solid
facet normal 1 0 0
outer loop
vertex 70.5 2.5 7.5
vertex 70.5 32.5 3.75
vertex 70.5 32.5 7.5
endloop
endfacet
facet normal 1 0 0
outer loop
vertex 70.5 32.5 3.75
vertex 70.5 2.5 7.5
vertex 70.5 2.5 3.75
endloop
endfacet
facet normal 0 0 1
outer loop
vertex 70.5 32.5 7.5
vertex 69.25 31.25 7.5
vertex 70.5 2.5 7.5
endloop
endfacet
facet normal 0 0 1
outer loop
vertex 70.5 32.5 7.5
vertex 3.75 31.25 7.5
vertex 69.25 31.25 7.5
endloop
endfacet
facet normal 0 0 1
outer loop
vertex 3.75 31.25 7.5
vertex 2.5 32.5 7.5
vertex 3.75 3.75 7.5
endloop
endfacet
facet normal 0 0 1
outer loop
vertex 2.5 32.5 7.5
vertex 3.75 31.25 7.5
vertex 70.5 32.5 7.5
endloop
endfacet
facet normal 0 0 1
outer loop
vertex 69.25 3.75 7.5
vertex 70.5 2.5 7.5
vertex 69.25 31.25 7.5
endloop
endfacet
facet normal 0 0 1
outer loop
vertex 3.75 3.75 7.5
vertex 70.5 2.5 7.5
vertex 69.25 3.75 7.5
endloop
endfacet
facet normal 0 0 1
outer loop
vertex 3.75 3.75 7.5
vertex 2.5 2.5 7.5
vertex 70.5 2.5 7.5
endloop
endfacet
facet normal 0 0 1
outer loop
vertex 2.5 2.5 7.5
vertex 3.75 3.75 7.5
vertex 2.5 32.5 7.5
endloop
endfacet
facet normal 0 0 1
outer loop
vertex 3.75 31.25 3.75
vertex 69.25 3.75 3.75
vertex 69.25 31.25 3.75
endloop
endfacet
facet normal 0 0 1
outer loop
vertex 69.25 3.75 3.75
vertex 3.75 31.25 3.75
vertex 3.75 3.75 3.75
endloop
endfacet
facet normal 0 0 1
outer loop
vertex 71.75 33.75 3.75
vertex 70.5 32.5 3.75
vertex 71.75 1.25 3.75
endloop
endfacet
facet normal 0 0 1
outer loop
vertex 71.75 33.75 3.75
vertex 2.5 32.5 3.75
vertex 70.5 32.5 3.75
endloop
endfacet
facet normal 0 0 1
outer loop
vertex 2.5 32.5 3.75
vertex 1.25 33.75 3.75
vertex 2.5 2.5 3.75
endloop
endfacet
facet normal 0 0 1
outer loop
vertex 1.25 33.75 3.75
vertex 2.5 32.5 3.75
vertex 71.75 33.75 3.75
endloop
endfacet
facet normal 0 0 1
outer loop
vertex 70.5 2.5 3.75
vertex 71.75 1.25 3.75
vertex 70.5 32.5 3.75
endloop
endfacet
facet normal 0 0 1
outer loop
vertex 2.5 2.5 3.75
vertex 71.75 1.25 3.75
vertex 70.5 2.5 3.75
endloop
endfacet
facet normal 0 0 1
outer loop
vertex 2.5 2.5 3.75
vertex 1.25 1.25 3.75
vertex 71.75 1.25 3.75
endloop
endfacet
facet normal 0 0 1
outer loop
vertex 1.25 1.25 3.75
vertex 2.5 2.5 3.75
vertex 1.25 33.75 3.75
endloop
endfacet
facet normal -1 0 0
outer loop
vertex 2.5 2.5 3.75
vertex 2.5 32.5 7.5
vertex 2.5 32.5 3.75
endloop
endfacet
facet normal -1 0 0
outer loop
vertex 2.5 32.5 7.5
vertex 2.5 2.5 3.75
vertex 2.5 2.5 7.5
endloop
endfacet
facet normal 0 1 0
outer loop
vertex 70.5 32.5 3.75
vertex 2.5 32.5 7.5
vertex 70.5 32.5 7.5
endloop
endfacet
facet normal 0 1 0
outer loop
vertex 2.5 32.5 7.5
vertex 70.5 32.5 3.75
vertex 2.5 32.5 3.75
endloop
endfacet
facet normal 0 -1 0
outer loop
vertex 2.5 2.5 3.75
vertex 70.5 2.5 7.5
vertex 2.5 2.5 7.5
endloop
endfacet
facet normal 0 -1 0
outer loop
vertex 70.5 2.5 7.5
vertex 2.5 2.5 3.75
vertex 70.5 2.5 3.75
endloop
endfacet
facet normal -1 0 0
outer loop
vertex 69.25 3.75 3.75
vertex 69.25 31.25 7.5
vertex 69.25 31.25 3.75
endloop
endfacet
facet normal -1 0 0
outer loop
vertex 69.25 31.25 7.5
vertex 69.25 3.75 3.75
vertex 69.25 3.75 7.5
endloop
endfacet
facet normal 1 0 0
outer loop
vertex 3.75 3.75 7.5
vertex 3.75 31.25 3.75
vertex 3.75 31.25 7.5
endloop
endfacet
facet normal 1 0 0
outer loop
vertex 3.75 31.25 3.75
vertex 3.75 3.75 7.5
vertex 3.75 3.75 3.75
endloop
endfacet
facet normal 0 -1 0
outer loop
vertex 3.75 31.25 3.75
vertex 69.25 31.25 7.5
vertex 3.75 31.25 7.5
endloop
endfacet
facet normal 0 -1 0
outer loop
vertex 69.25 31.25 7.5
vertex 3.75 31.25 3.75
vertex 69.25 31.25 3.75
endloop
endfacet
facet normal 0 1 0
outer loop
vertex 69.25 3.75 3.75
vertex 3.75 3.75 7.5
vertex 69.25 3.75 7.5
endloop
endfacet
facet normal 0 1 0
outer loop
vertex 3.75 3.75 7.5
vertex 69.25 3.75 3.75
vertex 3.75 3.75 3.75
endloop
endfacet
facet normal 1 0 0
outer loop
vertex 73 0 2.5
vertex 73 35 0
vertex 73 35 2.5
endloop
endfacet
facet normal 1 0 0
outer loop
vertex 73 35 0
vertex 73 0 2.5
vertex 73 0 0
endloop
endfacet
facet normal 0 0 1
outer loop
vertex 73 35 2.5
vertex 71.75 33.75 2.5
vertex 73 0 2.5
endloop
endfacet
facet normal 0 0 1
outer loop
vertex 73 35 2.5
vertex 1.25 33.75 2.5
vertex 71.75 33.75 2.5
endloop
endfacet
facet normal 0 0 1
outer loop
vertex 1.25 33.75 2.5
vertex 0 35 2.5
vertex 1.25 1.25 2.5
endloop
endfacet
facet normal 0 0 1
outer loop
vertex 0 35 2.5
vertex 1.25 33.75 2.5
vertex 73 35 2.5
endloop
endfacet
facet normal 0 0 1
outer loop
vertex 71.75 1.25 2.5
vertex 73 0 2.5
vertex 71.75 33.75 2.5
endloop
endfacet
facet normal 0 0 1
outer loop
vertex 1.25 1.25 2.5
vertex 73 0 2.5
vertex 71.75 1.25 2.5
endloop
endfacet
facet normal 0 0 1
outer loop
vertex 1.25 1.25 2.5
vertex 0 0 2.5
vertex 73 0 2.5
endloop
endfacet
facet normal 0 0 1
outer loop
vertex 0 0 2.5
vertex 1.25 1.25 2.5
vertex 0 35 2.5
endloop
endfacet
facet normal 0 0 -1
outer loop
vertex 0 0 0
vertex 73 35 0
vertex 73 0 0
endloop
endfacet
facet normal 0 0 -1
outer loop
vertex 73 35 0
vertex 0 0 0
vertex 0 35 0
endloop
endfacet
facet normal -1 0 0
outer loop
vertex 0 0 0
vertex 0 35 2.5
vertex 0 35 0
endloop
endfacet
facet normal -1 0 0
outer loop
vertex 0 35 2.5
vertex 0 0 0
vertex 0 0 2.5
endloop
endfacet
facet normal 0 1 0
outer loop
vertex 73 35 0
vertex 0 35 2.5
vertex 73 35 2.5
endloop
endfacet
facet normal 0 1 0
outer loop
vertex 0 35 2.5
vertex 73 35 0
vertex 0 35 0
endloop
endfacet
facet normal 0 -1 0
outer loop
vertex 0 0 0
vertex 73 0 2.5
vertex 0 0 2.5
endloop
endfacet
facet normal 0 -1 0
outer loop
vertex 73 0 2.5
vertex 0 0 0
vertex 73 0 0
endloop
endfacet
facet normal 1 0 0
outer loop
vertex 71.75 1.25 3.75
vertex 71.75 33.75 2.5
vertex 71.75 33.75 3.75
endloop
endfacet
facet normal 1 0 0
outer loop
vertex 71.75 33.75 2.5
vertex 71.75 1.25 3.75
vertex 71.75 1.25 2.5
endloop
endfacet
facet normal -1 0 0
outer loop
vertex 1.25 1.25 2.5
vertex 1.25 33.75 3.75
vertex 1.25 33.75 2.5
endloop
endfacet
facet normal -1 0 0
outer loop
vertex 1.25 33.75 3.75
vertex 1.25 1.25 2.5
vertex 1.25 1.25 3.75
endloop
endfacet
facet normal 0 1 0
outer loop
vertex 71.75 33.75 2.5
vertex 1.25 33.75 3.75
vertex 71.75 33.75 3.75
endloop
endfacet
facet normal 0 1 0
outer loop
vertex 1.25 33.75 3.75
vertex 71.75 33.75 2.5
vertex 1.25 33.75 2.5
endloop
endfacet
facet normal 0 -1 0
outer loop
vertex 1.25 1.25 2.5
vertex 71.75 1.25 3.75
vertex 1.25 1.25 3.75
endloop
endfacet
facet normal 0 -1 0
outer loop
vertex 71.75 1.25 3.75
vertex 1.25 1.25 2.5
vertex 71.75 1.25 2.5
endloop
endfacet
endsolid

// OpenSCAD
lx = 68;
ly = 30;
lz = 22;

ledRadius = 5 / 2;
thickness = 2.5;
ledSpacing = 23.5 / 3;

module top() {

	cube([lx + thickness * 2, ly + thickness * 2, thickness]);

	translate([thickness / 2, thickness / 2, thickness])
	cube([lx + thickness, ly + thickness, thickness / 2]);

	difference() {
		translate([thickness, thickness, thickness * 1.5])
		cube([lx, ly, thickness * 1.5]);

		translate([thickness * 1.5, thickness * 1.5, thickness * 1.5])
		cube([lx - thickness, ly - thickness, thickness * 2]);
	}

}

module bottom() {

	difference() {
		cube([lx + thickness * 2, ly + thickness * 2, lz + thickness]);

		translate([thickness, thickness, thickness + 1])
		cube([lx, ly, lz + 1]);

		translate([thickness / 2, thickness / 2, lz + thickness / 2 + 1])
		cube([lx + thickness, ly + thickness, thickness / 2 + 1]);

		translate([thickness + lx - 54, thickness, thickness + 3])
		board();

		translate([lx, ly / 4 + thickness, lz / 2])
		rotate([0, 90, 0])
		cylinder(r = 4.8 / 2, h = 10);
	}

}

module leds() {
	for(x = [0 : 3]) {
		translate([(ledRadius * 4 * x), 0, 0])
		cylinder(h = thickness * 2, r = ledRadius);
	}
}

module board() {
	cube([54, 30, 1]);

	for(x = [0 : 3]) {
		translate([6.5 + x * ledSpacing, 6, -8.5])
		cylinder(r = ledRadius, h = 8.5);
	}

	translate([43, 3.5, -14.2])
	cube([6, 6, 14.2]);
}

//top();
//bottom();
//leds();

/*
difference() {

	top();

	linear_extrude(height = 10)
	scale([0.07, 0.07, 0.07])
	translate([100, -350, 0])
	import("../hello.dxf");

}
*/

difference() {
	top();

	translate([4, 20, -1])
	linear_extrude(height = 2)
	mirror([0, 1, 0])
	scale([0.3, 0.3, 0.3])
	import("susana1.dxf");

	translate([30, 33, -1])
	linear_extrude(height = 2)
	mirror([0, 1, 0])
	scale([0.15, 0.15, 0.15])
	import("../tavaubry.dxf");
}



//% bottom();
